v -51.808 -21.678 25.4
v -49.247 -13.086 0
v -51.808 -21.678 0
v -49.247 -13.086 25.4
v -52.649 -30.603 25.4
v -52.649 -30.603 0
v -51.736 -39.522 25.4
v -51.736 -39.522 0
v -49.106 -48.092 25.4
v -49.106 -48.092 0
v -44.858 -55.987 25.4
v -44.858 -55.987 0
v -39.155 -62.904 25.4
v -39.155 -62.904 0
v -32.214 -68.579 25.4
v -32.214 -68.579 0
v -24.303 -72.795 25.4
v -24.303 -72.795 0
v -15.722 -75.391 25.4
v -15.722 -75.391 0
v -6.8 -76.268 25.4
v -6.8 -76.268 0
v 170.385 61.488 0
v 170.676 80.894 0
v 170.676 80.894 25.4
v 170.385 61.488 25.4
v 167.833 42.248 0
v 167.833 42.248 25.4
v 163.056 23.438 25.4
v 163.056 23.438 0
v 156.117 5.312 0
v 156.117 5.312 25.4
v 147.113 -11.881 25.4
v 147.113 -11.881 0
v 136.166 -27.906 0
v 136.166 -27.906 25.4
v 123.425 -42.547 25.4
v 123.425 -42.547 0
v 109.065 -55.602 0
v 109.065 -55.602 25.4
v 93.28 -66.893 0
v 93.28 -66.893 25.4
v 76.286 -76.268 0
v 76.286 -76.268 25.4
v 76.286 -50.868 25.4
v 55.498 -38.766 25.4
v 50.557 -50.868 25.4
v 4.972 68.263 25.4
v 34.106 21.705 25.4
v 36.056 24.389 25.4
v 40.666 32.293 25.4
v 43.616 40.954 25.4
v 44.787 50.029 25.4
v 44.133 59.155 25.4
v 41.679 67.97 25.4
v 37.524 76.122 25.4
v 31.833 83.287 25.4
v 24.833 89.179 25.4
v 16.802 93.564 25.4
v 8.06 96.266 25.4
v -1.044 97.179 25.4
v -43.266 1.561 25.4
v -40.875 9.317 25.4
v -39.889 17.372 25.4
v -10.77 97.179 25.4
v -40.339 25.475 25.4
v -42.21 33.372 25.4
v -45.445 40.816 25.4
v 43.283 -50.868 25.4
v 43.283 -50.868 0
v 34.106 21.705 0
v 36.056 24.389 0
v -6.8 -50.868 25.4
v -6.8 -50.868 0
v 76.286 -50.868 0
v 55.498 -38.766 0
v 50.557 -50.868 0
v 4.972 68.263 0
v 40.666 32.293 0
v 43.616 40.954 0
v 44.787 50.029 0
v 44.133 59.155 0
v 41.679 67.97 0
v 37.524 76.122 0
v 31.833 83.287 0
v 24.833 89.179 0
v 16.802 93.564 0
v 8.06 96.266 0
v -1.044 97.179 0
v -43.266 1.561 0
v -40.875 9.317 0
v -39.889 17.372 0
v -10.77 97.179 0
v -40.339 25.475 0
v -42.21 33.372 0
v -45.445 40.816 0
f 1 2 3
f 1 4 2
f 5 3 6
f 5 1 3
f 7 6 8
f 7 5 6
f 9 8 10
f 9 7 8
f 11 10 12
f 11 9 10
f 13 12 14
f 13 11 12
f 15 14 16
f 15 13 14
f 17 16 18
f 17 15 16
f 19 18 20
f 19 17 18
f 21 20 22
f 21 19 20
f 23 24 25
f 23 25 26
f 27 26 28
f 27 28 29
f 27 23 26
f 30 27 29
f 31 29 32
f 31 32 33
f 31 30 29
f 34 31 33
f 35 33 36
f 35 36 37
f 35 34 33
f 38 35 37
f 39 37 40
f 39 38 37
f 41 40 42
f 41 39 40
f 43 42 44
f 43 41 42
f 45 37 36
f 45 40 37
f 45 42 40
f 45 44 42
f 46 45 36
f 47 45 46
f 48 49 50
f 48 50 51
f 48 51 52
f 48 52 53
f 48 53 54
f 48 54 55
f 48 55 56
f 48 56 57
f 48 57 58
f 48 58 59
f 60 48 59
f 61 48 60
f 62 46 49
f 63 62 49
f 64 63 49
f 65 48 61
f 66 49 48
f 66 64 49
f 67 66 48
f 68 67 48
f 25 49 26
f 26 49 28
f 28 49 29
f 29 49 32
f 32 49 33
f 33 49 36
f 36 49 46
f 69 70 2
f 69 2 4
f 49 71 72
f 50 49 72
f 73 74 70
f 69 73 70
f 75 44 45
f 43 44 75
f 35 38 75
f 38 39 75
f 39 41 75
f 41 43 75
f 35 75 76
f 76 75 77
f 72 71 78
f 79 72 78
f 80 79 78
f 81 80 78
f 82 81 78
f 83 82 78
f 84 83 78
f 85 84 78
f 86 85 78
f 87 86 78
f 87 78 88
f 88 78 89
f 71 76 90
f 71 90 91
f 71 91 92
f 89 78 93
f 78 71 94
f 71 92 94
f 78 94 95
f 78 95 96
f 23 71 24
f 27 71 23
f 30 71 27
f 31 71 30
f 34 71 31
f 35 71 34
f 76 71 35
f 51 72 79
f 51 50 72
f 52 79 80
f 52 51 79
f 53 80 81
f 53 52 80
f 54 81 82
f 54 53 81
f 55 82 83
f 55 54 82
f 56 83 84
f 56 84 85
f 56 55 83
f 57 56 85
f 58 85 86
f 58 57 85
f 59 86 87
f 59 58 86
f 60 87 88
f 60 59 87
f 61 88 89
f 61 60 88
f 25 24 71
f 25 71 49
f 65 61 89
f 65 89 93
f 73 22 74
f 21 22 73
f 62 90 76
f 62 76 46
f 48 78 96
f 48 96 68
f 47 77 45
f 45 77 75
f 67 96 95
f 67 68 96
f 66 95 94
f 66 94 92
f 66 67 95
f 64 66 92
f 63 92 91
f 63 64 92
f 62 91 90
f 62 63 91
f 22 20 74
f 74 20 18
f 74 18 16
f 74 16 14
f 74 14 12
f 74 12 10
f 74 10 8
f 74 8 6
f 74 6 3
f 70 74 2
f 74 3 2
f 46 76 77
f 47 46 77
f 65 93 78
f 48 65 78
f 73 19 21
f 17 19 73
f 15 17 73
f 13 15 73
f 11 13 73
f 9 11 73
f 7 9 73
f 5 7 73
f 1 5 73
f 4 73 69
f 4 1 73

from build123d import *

# Parameters (mm, degrees)
F1_DEPTH    = 25.4
F2_R        = 45.8493910303
F3_DEPTH    = 148.844
F4_DEPTH    = 106.68
F5_DEPTH    = 57.404
F6_T1_DEPTH = 801.4030056795
F7_DEPTH    = 25.4


# Not quite as in the source:
# - a fillet or chamfer that OpenCascade refuses, or shapes differently, is made with other operations: its cross-section is extruded or revolved along the edge and cut away or added


with BuildPart() as f1:
    # F0 (on Top) → F1 (new body)
    with BuildSketch(Plane.XY):
        with BuildLine():
            Line((-75.0448331237, -76.2676075101), (0, 0))
            add(Edge.make_bspline(
                [(0, 0), (-17.1607195909, -0.0678450845), (-34.6268538829, 9.7280369702), (-35.0408777595, 21.7053014785)],
                knots=[0, 0, 0, 0, 0.2466068587, 0.2466068587, 0.2466068587, 0.2466068587], degree=3))
            Line((-35.0408777595, 21.7053014785), (-75.0448331237, -76.2676075101))
        make_face()
        with BuildLine():
            add(Edge.make_bspline(
                [(0, 0), (-17.1607195909, -0.0678450845), (-34.6268538829, 9.7280369702), (-35.0408777595, 21.7053014785)],
                knots=[0, 0, 0, 0, 0.2466068587, 0.2466068587, 0.2466068587, 0.2466068587], degree=3))
            add(Edge.make_bspline(
                [(34.106452018, 21.7053014785), (33.6908138887, 9.8087295701), (16.995182387, 0.0671906315), (0, 0)],
                knots=[0.7557719815, 0.7557719815, 0.7557719815, 0.7557719815, 1, 1, 1, 1], degree=3))
            add(Edge.make_bspline(
                [(0, 48.8035753369), (17.42740955, 48.7254776276), (34.5378985933, 34.0543494732), (34.106452018, 21.7053014785)],
                knots=[0.5022549562, 0.5022549562, 0.5022549562, 0.5022549562, 0.7557719815, 0.7557719815, 0.7557719815, 0.7557719815], degree=3))
            add(Edge.make_bspline(
                [(-35.0408777595, 21.7053014785), (-35.4700808114, 34.1216831702), (-17.5739049114, 48.8823295381), (0, 48.8035753369)],
                knots=[0.2466068587, 0.2466068587, 0.2466068587, 0.2466068587, 0.5022549562, 0.5022549562, 0.5022549562, 0.5022549562], degree=3))
        make_face()
        Polygon((76.5672177076, -76.2676075101), (0, 0), (-75.0448331237, -76.2676075101), align=None)
        with BuildLine():
            add(Edge.make_bspline(
                [(34.106452018, 21.7053014785), (33.6908138887, 9.8087295701), (16.995182387, 0.0671906315), (0, 0)],
                knots=[0.7557719815, 0.7557719815, 0.7557719815, 0.7557719815, 1, 1, 1, 1], degree=3))
            Line((0, 0), (76.5672177076, -76.2676075101))
            Line((76.5672177076, -76.2676075101), (34.106452018, 21.7053014785))
        make_face()
        with BuildLine():
            Line((-76.1296525598, 97.1791520715), (-35.0408777595, 21.7053014785))
            add(Edge.make_bspline(
                [(-35.0408777595, 21.7053014785), (-35.4700808114, 34.1216831702), (-17.5739049114, 48.8823295381), (0, 48.8035753369)],
                knots=[0.2466068587, 0.2466068587, 0.2466068587, 0.2466068587, 0.5022549562, 0.5022549562, 0.5022549562, 0.5022549562], degree=3))
            Line((0, 48.8035753369), (0, 97.1791520715))
            Line((0, 97.1791520715), (-76.1296525598, 97.1791520715))
        make_face()
        with BuildLine():
            add(Edge.make_bspline(
                [(0, 48.8035753369), (17.42740955, 48.7254776276), (34.5378985933, 34.0543494732), (34.106452018, 21.7053014785)],
                knots=[0.5022549562, 0.5022549562, 0.5022549562, 0.5022549562, 0.7557719815, 0.7557719815, 0.7557719815, 0.7557719815], degree=3))
            Line((34.106452018, 21.7053014785), (88.9128223062, 97.1791520715))
            Line((88.9128223062, 97.1791520715), (0, 97.1791520715))
            Line((0, 97.1791520715), (0, 48.8035753369))
        make_face()
    extrude(amount=F1_DEPTH)

    # F2
    f2_edges = [f1.edges().sort_by_distance(p)[0] for p in [
        (88.912822, 97.179152, 12.7),
        (-35.040878, 21.705301, 12.7),
        (-75.044833, -76.267608, 12.7),
    ]]
    fillet(f2_edges, radius=F2_R)

    # F3 (add): a face of the model
    f3_faces = [f1.faces().sort_by_distance(p)[0] for p in [
        (55.3368348628, -27.2811530158, 12.7),
    ]]
    extrude(f3_faces, amount=F3_DEPTH)

    # F4 (cut): a face of the model
    f4_faces = [f1.faces().sort_by_distance(p)[0] for p in [
        (-46.2564858481, -5.7626261429, 12.7),
    ]]
    extrude(f4_faces, amount=-F4_DEPTH, mode=Mode.SUBTRACT)

    # F5 (cut): a face of the model
    f5_faces = [f1.faces().sort_by_distance(p)[0] for p in [
        (-60.7872022152, 68.997396576, 12.7),
    ]]
    extrude(f5_faces, amount=-F5_DEPTH, mode=Mode.SUBTRACT)

    # F6: fillet of radius 166.1799763524 on 1 edges, made by hand

    # F6_s2 → F6_t1 (cut)
    with BuildSketch(Plane.XY.offset(-388.0015028397)):
        with BuildLine():
            ThreePointArc((170.6761321798, 80.8936347588), (145.5192693359, -14.4805618017), (70.7348093872, -78.7953320174))
            Line((70.7348093872, -78.7953320174), (213.1368978695, -17.0792742298))
            Line((213.1368978695, -17.0792742298), (170.6761321798, 80.8936347588))
        make_face()
    extrude(amount=F6_T1_DEPTH, mode=Mode.SUBTRACT)

    # F7 (cut): a face of the model
    f7_faces = [f1.faces().sort_by_distance(p)[0] for p in [
        (34.7430737503, -76.2676075101, 12.7),
    ]]
    extrude(f7_faces, amount=-F7_DEPTH, mode=Mode.SUBTRACT)


solid = f1.part
